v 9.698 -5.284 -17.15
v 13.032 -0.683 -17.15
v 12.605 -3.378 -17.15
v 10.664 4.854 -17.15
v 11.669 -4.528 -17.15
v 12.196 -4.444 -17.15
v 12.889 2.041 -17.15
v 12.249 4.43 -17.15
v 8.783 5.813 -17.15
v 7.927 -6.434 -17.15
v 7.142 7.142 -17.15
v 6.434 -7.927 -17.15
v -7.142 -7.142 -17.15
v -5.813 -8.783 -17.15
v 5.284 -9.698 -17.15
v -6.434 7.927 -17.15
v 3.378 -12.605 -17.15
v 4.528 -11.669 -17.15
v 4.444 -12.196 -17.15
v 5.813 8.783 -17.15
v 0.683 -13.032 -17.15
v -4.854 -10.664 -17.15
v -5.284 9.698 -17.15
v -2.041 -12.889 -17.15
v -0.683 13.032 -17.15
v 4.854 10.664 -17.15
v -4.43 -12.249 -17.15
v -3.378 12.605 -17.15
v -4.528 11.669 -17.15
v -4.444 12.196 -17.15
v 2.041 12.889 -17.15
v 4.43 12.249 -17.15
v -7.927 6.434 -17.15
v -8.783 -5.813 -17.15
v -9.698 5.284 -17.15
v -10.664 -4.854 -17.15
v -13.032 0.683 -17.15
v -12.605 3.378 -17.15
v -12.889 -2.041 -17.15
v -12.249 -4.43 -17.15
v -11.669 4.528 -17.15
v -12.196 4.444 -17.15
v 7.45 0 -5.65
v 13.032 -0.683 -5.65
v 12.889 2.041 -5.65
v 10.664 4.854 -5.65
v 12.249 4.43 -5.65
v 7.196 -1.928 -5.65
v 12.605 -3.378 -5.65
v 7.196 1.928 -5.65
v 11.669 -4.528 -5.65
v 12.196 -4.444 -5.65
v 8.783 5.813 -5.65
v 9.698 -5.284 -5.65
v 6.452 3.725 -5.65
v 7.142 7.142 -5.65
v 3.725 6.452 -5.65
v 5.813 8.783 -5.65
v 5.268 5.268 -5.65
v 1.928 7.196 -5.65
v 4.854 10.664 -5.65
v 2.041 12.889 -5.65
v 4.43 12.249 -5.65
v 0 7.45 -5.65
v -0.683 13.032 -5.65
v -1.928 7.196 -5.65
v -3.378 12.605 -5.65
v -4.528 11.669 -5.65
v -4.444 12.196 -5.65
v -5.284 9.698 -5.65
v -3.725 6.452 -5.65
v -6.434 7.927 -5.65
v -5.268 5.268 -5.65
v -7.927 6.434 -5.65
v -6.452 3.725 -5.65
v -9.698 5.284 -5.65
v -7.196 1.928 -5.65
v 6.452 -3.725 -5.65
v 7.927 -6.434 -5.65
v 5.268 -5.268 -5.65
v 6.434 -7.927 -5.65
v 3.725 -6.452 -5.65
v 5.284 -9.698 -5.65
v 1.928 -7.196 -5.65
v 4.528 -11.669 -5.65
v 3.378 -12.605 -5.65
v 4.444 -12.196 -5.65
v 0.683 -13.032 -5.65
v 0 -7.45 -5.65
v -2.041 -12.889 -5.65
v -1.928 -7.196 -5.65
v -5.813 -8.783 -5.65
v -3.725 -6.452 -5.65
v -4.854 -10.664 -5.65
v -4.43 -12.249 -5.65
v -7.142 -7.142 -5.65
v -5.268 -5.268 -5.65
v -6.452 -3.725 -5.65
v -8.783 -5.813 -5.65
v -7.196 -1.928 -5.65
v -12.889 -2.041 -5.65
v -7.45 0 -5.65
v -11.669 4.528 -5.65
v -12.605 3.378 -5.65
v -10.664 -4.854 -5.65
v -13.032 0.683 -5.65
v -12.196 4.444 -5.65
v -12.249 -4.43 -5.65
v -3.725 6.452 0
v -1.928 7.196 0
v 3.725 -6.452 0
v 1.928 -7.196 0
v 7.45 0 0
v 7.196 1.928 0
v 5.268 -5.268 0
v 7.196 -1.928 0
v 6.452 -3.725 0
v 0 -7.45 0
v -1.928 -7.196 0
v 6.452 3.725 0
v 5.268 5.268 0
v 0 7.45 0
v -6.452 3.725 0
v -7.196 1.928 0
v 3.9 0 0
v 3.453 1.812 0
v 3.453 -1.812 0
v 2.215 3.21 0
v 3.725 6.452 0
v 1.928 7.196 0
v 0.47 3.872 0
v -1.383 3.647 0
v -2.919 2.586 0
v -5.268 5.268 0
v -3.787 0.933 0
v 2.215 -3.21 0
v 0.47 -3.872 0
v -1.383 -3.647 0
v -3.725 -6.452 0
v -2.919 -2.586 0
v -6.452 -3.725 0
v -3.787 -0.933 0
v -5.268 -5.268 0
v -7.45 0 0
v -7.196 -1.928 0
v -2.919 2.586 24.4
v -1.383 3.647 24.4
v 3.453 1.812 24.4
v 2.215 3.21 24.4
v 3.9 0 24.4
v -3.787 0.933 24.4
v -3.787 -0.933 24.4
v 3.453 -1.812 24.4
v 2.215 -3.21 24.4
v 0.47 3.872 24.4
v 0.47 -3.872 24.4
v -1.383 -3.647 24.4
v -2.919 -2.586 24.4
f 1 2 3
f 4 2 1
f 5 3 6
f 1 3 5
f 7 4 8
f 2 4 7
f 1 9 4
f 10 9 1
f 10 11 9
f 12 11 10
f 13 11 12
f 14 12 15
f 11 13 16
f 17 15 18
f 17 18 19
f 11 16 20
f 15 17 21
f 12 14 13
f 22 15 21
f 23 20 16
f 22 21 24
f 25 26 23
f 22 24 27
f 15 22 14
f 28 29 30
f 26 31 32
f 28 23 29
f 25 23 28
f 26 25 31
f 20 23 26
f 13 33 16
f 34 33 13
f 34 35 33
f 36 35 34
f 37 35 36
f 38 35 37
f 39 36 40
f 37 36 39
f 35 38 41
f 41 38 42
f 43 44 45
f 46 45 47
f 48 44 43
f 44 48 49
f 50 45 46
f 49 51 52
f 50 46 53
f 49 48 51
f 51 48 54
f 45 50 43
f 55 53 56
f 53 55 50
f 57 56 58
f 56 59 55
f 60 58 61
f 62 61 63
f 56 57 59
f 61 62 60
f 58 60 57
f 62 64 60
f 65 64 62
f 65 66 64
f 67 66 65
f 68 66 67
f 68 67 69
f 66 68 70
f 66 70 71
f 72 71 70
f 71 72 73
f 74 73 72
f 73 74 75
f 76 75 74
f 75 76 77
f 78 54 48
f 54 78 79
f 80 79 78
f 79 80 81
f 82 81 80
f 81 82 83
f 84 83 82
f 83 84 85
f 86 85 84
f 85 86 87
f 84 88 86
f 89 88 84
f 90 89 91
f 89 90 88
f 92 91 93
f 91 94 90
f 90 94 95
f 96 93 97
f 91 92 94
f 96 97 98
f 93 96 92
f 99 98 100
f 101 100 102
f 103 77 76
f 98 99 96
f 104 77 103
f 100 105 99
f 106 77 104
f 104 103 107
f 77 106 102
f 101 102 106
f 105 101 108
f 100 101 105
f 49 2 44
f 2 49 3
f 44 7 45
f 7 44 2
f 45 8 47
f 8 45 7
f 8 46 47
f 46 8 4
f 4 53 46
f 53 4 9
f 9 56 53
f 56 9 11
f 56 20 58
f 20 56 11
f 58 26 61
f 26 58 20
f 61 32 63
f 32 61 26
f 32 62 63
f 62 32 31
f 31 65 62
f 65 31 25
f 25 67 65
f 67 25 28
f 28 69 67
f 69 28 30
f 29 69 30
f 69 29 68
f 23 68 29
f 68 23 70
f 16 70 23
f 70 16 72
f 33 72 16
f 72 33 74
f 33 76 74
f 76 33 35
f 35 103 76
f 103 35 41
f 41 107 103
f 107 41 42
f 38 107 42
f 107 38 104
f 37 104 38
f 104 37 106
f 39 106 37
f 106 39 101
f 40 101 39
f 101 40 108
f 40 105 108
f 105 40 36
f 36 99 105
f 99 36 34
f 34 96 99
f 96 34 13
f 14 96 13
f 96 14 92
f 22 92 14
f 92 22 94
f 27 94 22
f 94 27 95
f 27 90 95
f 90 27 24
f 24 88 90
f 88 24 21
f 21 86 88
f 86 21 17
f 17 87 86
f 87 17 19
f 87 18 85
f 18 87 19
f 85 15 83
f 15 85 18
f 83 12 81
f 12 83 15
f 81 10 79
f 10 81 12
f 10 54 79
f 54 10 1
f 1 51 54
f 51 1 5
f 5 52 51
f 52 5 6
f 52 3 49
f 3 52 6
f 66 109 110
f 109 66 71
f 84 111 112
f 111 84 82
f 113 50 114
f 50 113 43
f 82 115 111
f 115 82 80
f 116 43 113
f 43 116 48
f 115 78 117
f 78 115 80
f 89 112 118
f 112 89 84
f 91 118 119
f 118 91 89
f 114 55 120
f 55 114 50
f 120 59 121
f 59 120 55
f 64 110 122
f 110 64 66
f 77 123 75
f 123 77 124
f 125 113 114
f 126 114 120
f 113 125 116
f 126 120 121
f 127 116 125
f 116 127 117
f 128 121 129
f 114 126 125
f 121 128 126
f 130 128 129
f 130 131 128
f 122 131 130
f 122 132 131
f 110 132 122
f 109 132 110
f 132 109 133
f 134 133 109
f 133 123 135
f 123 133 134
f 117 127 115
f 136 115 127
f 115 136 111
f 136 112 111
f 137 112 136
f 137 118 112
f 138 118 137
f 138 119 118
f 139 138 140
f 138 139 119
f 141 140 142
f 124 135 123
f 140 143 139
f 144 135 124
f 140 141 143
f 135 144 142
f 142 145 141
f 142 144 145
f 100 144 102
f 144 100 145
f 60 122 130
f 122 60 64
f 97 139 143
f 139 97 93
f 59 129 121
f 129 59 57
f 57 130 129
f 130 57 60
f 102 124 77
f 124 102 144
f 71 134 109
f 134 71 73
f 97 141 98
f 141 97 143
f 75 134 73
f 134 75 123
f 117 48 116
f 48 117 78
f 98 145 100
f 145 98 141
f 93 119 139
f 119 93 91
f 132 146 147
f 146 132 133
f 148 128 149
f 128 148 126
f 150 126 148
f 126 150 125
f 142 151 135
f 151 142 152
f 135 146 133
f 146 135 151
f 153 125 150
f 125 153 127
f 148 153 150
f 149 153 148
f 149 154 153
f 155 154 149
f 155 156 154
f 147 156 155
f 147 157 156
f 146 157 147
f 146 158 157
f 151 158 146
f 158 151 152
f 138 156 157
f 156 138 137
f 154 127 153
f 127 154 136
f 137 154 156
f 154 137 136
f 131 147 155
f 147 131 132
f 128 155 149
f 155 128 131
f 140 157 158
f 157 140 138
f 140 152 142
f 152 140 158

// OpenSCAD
// Defines a 4-star knob and optional machine screw as found on the
// iEQ30 Pro for securing a dovetail, attachng the mount to the pier/tripod
// and for tightening the latitude adjustment.
// Author: James Synge
// Units: mm

include <ieq30pro_dimensions.scad>

four_star_knob();

module four_star_knob(include_screw=true, zero_is_top=false) {
  total_knob_height = fsk_height + fsk_shoulder_height;
  drop_by = zero_is_top ? 0 : total_knob_height;

  translate([0, 0, -drop_by]) {
    color(plastic_color) {
      union() {
        linear_extrude(height=fsk_height, convexity=4) {
          four_star_knob_profile(fsk_inner_diam, fsk_notch_diam, fsk_outer_diam);
        };
        translate([0, 0, fsk_height])
          cylinder(h=fsk_shoulder_height, d=fsk_shoulder_diam);
      };
    }
    color(bearing_color) {
      translate([0, 0, total_knob_height]) {
        cylinder(h=fsk_screw_len, d=dec_head_clamp_screw_diam);

      }
    }
  }
}

module four_star_knob_profile(inner_diam, notch_diam, outer_diam) {
  assert(inner_diam < outer_diam);
  inner_radius = inner_diam / 2;
  delta = (inner_diam + notch_diam) / 2;

  rotate([0, 0, 45])
  difference() {
    circle(d=outer_diam);
    // Remove the four notches.
    translate([delta, 0]) circle(d=notch_diam);
    translate([-delta, 0]) circle(d=notch_diam);
    translate([0, delta]) circle(d=notch_diam);
    translate([0, -delta]) circle(d=notch_diam);
  }
}
